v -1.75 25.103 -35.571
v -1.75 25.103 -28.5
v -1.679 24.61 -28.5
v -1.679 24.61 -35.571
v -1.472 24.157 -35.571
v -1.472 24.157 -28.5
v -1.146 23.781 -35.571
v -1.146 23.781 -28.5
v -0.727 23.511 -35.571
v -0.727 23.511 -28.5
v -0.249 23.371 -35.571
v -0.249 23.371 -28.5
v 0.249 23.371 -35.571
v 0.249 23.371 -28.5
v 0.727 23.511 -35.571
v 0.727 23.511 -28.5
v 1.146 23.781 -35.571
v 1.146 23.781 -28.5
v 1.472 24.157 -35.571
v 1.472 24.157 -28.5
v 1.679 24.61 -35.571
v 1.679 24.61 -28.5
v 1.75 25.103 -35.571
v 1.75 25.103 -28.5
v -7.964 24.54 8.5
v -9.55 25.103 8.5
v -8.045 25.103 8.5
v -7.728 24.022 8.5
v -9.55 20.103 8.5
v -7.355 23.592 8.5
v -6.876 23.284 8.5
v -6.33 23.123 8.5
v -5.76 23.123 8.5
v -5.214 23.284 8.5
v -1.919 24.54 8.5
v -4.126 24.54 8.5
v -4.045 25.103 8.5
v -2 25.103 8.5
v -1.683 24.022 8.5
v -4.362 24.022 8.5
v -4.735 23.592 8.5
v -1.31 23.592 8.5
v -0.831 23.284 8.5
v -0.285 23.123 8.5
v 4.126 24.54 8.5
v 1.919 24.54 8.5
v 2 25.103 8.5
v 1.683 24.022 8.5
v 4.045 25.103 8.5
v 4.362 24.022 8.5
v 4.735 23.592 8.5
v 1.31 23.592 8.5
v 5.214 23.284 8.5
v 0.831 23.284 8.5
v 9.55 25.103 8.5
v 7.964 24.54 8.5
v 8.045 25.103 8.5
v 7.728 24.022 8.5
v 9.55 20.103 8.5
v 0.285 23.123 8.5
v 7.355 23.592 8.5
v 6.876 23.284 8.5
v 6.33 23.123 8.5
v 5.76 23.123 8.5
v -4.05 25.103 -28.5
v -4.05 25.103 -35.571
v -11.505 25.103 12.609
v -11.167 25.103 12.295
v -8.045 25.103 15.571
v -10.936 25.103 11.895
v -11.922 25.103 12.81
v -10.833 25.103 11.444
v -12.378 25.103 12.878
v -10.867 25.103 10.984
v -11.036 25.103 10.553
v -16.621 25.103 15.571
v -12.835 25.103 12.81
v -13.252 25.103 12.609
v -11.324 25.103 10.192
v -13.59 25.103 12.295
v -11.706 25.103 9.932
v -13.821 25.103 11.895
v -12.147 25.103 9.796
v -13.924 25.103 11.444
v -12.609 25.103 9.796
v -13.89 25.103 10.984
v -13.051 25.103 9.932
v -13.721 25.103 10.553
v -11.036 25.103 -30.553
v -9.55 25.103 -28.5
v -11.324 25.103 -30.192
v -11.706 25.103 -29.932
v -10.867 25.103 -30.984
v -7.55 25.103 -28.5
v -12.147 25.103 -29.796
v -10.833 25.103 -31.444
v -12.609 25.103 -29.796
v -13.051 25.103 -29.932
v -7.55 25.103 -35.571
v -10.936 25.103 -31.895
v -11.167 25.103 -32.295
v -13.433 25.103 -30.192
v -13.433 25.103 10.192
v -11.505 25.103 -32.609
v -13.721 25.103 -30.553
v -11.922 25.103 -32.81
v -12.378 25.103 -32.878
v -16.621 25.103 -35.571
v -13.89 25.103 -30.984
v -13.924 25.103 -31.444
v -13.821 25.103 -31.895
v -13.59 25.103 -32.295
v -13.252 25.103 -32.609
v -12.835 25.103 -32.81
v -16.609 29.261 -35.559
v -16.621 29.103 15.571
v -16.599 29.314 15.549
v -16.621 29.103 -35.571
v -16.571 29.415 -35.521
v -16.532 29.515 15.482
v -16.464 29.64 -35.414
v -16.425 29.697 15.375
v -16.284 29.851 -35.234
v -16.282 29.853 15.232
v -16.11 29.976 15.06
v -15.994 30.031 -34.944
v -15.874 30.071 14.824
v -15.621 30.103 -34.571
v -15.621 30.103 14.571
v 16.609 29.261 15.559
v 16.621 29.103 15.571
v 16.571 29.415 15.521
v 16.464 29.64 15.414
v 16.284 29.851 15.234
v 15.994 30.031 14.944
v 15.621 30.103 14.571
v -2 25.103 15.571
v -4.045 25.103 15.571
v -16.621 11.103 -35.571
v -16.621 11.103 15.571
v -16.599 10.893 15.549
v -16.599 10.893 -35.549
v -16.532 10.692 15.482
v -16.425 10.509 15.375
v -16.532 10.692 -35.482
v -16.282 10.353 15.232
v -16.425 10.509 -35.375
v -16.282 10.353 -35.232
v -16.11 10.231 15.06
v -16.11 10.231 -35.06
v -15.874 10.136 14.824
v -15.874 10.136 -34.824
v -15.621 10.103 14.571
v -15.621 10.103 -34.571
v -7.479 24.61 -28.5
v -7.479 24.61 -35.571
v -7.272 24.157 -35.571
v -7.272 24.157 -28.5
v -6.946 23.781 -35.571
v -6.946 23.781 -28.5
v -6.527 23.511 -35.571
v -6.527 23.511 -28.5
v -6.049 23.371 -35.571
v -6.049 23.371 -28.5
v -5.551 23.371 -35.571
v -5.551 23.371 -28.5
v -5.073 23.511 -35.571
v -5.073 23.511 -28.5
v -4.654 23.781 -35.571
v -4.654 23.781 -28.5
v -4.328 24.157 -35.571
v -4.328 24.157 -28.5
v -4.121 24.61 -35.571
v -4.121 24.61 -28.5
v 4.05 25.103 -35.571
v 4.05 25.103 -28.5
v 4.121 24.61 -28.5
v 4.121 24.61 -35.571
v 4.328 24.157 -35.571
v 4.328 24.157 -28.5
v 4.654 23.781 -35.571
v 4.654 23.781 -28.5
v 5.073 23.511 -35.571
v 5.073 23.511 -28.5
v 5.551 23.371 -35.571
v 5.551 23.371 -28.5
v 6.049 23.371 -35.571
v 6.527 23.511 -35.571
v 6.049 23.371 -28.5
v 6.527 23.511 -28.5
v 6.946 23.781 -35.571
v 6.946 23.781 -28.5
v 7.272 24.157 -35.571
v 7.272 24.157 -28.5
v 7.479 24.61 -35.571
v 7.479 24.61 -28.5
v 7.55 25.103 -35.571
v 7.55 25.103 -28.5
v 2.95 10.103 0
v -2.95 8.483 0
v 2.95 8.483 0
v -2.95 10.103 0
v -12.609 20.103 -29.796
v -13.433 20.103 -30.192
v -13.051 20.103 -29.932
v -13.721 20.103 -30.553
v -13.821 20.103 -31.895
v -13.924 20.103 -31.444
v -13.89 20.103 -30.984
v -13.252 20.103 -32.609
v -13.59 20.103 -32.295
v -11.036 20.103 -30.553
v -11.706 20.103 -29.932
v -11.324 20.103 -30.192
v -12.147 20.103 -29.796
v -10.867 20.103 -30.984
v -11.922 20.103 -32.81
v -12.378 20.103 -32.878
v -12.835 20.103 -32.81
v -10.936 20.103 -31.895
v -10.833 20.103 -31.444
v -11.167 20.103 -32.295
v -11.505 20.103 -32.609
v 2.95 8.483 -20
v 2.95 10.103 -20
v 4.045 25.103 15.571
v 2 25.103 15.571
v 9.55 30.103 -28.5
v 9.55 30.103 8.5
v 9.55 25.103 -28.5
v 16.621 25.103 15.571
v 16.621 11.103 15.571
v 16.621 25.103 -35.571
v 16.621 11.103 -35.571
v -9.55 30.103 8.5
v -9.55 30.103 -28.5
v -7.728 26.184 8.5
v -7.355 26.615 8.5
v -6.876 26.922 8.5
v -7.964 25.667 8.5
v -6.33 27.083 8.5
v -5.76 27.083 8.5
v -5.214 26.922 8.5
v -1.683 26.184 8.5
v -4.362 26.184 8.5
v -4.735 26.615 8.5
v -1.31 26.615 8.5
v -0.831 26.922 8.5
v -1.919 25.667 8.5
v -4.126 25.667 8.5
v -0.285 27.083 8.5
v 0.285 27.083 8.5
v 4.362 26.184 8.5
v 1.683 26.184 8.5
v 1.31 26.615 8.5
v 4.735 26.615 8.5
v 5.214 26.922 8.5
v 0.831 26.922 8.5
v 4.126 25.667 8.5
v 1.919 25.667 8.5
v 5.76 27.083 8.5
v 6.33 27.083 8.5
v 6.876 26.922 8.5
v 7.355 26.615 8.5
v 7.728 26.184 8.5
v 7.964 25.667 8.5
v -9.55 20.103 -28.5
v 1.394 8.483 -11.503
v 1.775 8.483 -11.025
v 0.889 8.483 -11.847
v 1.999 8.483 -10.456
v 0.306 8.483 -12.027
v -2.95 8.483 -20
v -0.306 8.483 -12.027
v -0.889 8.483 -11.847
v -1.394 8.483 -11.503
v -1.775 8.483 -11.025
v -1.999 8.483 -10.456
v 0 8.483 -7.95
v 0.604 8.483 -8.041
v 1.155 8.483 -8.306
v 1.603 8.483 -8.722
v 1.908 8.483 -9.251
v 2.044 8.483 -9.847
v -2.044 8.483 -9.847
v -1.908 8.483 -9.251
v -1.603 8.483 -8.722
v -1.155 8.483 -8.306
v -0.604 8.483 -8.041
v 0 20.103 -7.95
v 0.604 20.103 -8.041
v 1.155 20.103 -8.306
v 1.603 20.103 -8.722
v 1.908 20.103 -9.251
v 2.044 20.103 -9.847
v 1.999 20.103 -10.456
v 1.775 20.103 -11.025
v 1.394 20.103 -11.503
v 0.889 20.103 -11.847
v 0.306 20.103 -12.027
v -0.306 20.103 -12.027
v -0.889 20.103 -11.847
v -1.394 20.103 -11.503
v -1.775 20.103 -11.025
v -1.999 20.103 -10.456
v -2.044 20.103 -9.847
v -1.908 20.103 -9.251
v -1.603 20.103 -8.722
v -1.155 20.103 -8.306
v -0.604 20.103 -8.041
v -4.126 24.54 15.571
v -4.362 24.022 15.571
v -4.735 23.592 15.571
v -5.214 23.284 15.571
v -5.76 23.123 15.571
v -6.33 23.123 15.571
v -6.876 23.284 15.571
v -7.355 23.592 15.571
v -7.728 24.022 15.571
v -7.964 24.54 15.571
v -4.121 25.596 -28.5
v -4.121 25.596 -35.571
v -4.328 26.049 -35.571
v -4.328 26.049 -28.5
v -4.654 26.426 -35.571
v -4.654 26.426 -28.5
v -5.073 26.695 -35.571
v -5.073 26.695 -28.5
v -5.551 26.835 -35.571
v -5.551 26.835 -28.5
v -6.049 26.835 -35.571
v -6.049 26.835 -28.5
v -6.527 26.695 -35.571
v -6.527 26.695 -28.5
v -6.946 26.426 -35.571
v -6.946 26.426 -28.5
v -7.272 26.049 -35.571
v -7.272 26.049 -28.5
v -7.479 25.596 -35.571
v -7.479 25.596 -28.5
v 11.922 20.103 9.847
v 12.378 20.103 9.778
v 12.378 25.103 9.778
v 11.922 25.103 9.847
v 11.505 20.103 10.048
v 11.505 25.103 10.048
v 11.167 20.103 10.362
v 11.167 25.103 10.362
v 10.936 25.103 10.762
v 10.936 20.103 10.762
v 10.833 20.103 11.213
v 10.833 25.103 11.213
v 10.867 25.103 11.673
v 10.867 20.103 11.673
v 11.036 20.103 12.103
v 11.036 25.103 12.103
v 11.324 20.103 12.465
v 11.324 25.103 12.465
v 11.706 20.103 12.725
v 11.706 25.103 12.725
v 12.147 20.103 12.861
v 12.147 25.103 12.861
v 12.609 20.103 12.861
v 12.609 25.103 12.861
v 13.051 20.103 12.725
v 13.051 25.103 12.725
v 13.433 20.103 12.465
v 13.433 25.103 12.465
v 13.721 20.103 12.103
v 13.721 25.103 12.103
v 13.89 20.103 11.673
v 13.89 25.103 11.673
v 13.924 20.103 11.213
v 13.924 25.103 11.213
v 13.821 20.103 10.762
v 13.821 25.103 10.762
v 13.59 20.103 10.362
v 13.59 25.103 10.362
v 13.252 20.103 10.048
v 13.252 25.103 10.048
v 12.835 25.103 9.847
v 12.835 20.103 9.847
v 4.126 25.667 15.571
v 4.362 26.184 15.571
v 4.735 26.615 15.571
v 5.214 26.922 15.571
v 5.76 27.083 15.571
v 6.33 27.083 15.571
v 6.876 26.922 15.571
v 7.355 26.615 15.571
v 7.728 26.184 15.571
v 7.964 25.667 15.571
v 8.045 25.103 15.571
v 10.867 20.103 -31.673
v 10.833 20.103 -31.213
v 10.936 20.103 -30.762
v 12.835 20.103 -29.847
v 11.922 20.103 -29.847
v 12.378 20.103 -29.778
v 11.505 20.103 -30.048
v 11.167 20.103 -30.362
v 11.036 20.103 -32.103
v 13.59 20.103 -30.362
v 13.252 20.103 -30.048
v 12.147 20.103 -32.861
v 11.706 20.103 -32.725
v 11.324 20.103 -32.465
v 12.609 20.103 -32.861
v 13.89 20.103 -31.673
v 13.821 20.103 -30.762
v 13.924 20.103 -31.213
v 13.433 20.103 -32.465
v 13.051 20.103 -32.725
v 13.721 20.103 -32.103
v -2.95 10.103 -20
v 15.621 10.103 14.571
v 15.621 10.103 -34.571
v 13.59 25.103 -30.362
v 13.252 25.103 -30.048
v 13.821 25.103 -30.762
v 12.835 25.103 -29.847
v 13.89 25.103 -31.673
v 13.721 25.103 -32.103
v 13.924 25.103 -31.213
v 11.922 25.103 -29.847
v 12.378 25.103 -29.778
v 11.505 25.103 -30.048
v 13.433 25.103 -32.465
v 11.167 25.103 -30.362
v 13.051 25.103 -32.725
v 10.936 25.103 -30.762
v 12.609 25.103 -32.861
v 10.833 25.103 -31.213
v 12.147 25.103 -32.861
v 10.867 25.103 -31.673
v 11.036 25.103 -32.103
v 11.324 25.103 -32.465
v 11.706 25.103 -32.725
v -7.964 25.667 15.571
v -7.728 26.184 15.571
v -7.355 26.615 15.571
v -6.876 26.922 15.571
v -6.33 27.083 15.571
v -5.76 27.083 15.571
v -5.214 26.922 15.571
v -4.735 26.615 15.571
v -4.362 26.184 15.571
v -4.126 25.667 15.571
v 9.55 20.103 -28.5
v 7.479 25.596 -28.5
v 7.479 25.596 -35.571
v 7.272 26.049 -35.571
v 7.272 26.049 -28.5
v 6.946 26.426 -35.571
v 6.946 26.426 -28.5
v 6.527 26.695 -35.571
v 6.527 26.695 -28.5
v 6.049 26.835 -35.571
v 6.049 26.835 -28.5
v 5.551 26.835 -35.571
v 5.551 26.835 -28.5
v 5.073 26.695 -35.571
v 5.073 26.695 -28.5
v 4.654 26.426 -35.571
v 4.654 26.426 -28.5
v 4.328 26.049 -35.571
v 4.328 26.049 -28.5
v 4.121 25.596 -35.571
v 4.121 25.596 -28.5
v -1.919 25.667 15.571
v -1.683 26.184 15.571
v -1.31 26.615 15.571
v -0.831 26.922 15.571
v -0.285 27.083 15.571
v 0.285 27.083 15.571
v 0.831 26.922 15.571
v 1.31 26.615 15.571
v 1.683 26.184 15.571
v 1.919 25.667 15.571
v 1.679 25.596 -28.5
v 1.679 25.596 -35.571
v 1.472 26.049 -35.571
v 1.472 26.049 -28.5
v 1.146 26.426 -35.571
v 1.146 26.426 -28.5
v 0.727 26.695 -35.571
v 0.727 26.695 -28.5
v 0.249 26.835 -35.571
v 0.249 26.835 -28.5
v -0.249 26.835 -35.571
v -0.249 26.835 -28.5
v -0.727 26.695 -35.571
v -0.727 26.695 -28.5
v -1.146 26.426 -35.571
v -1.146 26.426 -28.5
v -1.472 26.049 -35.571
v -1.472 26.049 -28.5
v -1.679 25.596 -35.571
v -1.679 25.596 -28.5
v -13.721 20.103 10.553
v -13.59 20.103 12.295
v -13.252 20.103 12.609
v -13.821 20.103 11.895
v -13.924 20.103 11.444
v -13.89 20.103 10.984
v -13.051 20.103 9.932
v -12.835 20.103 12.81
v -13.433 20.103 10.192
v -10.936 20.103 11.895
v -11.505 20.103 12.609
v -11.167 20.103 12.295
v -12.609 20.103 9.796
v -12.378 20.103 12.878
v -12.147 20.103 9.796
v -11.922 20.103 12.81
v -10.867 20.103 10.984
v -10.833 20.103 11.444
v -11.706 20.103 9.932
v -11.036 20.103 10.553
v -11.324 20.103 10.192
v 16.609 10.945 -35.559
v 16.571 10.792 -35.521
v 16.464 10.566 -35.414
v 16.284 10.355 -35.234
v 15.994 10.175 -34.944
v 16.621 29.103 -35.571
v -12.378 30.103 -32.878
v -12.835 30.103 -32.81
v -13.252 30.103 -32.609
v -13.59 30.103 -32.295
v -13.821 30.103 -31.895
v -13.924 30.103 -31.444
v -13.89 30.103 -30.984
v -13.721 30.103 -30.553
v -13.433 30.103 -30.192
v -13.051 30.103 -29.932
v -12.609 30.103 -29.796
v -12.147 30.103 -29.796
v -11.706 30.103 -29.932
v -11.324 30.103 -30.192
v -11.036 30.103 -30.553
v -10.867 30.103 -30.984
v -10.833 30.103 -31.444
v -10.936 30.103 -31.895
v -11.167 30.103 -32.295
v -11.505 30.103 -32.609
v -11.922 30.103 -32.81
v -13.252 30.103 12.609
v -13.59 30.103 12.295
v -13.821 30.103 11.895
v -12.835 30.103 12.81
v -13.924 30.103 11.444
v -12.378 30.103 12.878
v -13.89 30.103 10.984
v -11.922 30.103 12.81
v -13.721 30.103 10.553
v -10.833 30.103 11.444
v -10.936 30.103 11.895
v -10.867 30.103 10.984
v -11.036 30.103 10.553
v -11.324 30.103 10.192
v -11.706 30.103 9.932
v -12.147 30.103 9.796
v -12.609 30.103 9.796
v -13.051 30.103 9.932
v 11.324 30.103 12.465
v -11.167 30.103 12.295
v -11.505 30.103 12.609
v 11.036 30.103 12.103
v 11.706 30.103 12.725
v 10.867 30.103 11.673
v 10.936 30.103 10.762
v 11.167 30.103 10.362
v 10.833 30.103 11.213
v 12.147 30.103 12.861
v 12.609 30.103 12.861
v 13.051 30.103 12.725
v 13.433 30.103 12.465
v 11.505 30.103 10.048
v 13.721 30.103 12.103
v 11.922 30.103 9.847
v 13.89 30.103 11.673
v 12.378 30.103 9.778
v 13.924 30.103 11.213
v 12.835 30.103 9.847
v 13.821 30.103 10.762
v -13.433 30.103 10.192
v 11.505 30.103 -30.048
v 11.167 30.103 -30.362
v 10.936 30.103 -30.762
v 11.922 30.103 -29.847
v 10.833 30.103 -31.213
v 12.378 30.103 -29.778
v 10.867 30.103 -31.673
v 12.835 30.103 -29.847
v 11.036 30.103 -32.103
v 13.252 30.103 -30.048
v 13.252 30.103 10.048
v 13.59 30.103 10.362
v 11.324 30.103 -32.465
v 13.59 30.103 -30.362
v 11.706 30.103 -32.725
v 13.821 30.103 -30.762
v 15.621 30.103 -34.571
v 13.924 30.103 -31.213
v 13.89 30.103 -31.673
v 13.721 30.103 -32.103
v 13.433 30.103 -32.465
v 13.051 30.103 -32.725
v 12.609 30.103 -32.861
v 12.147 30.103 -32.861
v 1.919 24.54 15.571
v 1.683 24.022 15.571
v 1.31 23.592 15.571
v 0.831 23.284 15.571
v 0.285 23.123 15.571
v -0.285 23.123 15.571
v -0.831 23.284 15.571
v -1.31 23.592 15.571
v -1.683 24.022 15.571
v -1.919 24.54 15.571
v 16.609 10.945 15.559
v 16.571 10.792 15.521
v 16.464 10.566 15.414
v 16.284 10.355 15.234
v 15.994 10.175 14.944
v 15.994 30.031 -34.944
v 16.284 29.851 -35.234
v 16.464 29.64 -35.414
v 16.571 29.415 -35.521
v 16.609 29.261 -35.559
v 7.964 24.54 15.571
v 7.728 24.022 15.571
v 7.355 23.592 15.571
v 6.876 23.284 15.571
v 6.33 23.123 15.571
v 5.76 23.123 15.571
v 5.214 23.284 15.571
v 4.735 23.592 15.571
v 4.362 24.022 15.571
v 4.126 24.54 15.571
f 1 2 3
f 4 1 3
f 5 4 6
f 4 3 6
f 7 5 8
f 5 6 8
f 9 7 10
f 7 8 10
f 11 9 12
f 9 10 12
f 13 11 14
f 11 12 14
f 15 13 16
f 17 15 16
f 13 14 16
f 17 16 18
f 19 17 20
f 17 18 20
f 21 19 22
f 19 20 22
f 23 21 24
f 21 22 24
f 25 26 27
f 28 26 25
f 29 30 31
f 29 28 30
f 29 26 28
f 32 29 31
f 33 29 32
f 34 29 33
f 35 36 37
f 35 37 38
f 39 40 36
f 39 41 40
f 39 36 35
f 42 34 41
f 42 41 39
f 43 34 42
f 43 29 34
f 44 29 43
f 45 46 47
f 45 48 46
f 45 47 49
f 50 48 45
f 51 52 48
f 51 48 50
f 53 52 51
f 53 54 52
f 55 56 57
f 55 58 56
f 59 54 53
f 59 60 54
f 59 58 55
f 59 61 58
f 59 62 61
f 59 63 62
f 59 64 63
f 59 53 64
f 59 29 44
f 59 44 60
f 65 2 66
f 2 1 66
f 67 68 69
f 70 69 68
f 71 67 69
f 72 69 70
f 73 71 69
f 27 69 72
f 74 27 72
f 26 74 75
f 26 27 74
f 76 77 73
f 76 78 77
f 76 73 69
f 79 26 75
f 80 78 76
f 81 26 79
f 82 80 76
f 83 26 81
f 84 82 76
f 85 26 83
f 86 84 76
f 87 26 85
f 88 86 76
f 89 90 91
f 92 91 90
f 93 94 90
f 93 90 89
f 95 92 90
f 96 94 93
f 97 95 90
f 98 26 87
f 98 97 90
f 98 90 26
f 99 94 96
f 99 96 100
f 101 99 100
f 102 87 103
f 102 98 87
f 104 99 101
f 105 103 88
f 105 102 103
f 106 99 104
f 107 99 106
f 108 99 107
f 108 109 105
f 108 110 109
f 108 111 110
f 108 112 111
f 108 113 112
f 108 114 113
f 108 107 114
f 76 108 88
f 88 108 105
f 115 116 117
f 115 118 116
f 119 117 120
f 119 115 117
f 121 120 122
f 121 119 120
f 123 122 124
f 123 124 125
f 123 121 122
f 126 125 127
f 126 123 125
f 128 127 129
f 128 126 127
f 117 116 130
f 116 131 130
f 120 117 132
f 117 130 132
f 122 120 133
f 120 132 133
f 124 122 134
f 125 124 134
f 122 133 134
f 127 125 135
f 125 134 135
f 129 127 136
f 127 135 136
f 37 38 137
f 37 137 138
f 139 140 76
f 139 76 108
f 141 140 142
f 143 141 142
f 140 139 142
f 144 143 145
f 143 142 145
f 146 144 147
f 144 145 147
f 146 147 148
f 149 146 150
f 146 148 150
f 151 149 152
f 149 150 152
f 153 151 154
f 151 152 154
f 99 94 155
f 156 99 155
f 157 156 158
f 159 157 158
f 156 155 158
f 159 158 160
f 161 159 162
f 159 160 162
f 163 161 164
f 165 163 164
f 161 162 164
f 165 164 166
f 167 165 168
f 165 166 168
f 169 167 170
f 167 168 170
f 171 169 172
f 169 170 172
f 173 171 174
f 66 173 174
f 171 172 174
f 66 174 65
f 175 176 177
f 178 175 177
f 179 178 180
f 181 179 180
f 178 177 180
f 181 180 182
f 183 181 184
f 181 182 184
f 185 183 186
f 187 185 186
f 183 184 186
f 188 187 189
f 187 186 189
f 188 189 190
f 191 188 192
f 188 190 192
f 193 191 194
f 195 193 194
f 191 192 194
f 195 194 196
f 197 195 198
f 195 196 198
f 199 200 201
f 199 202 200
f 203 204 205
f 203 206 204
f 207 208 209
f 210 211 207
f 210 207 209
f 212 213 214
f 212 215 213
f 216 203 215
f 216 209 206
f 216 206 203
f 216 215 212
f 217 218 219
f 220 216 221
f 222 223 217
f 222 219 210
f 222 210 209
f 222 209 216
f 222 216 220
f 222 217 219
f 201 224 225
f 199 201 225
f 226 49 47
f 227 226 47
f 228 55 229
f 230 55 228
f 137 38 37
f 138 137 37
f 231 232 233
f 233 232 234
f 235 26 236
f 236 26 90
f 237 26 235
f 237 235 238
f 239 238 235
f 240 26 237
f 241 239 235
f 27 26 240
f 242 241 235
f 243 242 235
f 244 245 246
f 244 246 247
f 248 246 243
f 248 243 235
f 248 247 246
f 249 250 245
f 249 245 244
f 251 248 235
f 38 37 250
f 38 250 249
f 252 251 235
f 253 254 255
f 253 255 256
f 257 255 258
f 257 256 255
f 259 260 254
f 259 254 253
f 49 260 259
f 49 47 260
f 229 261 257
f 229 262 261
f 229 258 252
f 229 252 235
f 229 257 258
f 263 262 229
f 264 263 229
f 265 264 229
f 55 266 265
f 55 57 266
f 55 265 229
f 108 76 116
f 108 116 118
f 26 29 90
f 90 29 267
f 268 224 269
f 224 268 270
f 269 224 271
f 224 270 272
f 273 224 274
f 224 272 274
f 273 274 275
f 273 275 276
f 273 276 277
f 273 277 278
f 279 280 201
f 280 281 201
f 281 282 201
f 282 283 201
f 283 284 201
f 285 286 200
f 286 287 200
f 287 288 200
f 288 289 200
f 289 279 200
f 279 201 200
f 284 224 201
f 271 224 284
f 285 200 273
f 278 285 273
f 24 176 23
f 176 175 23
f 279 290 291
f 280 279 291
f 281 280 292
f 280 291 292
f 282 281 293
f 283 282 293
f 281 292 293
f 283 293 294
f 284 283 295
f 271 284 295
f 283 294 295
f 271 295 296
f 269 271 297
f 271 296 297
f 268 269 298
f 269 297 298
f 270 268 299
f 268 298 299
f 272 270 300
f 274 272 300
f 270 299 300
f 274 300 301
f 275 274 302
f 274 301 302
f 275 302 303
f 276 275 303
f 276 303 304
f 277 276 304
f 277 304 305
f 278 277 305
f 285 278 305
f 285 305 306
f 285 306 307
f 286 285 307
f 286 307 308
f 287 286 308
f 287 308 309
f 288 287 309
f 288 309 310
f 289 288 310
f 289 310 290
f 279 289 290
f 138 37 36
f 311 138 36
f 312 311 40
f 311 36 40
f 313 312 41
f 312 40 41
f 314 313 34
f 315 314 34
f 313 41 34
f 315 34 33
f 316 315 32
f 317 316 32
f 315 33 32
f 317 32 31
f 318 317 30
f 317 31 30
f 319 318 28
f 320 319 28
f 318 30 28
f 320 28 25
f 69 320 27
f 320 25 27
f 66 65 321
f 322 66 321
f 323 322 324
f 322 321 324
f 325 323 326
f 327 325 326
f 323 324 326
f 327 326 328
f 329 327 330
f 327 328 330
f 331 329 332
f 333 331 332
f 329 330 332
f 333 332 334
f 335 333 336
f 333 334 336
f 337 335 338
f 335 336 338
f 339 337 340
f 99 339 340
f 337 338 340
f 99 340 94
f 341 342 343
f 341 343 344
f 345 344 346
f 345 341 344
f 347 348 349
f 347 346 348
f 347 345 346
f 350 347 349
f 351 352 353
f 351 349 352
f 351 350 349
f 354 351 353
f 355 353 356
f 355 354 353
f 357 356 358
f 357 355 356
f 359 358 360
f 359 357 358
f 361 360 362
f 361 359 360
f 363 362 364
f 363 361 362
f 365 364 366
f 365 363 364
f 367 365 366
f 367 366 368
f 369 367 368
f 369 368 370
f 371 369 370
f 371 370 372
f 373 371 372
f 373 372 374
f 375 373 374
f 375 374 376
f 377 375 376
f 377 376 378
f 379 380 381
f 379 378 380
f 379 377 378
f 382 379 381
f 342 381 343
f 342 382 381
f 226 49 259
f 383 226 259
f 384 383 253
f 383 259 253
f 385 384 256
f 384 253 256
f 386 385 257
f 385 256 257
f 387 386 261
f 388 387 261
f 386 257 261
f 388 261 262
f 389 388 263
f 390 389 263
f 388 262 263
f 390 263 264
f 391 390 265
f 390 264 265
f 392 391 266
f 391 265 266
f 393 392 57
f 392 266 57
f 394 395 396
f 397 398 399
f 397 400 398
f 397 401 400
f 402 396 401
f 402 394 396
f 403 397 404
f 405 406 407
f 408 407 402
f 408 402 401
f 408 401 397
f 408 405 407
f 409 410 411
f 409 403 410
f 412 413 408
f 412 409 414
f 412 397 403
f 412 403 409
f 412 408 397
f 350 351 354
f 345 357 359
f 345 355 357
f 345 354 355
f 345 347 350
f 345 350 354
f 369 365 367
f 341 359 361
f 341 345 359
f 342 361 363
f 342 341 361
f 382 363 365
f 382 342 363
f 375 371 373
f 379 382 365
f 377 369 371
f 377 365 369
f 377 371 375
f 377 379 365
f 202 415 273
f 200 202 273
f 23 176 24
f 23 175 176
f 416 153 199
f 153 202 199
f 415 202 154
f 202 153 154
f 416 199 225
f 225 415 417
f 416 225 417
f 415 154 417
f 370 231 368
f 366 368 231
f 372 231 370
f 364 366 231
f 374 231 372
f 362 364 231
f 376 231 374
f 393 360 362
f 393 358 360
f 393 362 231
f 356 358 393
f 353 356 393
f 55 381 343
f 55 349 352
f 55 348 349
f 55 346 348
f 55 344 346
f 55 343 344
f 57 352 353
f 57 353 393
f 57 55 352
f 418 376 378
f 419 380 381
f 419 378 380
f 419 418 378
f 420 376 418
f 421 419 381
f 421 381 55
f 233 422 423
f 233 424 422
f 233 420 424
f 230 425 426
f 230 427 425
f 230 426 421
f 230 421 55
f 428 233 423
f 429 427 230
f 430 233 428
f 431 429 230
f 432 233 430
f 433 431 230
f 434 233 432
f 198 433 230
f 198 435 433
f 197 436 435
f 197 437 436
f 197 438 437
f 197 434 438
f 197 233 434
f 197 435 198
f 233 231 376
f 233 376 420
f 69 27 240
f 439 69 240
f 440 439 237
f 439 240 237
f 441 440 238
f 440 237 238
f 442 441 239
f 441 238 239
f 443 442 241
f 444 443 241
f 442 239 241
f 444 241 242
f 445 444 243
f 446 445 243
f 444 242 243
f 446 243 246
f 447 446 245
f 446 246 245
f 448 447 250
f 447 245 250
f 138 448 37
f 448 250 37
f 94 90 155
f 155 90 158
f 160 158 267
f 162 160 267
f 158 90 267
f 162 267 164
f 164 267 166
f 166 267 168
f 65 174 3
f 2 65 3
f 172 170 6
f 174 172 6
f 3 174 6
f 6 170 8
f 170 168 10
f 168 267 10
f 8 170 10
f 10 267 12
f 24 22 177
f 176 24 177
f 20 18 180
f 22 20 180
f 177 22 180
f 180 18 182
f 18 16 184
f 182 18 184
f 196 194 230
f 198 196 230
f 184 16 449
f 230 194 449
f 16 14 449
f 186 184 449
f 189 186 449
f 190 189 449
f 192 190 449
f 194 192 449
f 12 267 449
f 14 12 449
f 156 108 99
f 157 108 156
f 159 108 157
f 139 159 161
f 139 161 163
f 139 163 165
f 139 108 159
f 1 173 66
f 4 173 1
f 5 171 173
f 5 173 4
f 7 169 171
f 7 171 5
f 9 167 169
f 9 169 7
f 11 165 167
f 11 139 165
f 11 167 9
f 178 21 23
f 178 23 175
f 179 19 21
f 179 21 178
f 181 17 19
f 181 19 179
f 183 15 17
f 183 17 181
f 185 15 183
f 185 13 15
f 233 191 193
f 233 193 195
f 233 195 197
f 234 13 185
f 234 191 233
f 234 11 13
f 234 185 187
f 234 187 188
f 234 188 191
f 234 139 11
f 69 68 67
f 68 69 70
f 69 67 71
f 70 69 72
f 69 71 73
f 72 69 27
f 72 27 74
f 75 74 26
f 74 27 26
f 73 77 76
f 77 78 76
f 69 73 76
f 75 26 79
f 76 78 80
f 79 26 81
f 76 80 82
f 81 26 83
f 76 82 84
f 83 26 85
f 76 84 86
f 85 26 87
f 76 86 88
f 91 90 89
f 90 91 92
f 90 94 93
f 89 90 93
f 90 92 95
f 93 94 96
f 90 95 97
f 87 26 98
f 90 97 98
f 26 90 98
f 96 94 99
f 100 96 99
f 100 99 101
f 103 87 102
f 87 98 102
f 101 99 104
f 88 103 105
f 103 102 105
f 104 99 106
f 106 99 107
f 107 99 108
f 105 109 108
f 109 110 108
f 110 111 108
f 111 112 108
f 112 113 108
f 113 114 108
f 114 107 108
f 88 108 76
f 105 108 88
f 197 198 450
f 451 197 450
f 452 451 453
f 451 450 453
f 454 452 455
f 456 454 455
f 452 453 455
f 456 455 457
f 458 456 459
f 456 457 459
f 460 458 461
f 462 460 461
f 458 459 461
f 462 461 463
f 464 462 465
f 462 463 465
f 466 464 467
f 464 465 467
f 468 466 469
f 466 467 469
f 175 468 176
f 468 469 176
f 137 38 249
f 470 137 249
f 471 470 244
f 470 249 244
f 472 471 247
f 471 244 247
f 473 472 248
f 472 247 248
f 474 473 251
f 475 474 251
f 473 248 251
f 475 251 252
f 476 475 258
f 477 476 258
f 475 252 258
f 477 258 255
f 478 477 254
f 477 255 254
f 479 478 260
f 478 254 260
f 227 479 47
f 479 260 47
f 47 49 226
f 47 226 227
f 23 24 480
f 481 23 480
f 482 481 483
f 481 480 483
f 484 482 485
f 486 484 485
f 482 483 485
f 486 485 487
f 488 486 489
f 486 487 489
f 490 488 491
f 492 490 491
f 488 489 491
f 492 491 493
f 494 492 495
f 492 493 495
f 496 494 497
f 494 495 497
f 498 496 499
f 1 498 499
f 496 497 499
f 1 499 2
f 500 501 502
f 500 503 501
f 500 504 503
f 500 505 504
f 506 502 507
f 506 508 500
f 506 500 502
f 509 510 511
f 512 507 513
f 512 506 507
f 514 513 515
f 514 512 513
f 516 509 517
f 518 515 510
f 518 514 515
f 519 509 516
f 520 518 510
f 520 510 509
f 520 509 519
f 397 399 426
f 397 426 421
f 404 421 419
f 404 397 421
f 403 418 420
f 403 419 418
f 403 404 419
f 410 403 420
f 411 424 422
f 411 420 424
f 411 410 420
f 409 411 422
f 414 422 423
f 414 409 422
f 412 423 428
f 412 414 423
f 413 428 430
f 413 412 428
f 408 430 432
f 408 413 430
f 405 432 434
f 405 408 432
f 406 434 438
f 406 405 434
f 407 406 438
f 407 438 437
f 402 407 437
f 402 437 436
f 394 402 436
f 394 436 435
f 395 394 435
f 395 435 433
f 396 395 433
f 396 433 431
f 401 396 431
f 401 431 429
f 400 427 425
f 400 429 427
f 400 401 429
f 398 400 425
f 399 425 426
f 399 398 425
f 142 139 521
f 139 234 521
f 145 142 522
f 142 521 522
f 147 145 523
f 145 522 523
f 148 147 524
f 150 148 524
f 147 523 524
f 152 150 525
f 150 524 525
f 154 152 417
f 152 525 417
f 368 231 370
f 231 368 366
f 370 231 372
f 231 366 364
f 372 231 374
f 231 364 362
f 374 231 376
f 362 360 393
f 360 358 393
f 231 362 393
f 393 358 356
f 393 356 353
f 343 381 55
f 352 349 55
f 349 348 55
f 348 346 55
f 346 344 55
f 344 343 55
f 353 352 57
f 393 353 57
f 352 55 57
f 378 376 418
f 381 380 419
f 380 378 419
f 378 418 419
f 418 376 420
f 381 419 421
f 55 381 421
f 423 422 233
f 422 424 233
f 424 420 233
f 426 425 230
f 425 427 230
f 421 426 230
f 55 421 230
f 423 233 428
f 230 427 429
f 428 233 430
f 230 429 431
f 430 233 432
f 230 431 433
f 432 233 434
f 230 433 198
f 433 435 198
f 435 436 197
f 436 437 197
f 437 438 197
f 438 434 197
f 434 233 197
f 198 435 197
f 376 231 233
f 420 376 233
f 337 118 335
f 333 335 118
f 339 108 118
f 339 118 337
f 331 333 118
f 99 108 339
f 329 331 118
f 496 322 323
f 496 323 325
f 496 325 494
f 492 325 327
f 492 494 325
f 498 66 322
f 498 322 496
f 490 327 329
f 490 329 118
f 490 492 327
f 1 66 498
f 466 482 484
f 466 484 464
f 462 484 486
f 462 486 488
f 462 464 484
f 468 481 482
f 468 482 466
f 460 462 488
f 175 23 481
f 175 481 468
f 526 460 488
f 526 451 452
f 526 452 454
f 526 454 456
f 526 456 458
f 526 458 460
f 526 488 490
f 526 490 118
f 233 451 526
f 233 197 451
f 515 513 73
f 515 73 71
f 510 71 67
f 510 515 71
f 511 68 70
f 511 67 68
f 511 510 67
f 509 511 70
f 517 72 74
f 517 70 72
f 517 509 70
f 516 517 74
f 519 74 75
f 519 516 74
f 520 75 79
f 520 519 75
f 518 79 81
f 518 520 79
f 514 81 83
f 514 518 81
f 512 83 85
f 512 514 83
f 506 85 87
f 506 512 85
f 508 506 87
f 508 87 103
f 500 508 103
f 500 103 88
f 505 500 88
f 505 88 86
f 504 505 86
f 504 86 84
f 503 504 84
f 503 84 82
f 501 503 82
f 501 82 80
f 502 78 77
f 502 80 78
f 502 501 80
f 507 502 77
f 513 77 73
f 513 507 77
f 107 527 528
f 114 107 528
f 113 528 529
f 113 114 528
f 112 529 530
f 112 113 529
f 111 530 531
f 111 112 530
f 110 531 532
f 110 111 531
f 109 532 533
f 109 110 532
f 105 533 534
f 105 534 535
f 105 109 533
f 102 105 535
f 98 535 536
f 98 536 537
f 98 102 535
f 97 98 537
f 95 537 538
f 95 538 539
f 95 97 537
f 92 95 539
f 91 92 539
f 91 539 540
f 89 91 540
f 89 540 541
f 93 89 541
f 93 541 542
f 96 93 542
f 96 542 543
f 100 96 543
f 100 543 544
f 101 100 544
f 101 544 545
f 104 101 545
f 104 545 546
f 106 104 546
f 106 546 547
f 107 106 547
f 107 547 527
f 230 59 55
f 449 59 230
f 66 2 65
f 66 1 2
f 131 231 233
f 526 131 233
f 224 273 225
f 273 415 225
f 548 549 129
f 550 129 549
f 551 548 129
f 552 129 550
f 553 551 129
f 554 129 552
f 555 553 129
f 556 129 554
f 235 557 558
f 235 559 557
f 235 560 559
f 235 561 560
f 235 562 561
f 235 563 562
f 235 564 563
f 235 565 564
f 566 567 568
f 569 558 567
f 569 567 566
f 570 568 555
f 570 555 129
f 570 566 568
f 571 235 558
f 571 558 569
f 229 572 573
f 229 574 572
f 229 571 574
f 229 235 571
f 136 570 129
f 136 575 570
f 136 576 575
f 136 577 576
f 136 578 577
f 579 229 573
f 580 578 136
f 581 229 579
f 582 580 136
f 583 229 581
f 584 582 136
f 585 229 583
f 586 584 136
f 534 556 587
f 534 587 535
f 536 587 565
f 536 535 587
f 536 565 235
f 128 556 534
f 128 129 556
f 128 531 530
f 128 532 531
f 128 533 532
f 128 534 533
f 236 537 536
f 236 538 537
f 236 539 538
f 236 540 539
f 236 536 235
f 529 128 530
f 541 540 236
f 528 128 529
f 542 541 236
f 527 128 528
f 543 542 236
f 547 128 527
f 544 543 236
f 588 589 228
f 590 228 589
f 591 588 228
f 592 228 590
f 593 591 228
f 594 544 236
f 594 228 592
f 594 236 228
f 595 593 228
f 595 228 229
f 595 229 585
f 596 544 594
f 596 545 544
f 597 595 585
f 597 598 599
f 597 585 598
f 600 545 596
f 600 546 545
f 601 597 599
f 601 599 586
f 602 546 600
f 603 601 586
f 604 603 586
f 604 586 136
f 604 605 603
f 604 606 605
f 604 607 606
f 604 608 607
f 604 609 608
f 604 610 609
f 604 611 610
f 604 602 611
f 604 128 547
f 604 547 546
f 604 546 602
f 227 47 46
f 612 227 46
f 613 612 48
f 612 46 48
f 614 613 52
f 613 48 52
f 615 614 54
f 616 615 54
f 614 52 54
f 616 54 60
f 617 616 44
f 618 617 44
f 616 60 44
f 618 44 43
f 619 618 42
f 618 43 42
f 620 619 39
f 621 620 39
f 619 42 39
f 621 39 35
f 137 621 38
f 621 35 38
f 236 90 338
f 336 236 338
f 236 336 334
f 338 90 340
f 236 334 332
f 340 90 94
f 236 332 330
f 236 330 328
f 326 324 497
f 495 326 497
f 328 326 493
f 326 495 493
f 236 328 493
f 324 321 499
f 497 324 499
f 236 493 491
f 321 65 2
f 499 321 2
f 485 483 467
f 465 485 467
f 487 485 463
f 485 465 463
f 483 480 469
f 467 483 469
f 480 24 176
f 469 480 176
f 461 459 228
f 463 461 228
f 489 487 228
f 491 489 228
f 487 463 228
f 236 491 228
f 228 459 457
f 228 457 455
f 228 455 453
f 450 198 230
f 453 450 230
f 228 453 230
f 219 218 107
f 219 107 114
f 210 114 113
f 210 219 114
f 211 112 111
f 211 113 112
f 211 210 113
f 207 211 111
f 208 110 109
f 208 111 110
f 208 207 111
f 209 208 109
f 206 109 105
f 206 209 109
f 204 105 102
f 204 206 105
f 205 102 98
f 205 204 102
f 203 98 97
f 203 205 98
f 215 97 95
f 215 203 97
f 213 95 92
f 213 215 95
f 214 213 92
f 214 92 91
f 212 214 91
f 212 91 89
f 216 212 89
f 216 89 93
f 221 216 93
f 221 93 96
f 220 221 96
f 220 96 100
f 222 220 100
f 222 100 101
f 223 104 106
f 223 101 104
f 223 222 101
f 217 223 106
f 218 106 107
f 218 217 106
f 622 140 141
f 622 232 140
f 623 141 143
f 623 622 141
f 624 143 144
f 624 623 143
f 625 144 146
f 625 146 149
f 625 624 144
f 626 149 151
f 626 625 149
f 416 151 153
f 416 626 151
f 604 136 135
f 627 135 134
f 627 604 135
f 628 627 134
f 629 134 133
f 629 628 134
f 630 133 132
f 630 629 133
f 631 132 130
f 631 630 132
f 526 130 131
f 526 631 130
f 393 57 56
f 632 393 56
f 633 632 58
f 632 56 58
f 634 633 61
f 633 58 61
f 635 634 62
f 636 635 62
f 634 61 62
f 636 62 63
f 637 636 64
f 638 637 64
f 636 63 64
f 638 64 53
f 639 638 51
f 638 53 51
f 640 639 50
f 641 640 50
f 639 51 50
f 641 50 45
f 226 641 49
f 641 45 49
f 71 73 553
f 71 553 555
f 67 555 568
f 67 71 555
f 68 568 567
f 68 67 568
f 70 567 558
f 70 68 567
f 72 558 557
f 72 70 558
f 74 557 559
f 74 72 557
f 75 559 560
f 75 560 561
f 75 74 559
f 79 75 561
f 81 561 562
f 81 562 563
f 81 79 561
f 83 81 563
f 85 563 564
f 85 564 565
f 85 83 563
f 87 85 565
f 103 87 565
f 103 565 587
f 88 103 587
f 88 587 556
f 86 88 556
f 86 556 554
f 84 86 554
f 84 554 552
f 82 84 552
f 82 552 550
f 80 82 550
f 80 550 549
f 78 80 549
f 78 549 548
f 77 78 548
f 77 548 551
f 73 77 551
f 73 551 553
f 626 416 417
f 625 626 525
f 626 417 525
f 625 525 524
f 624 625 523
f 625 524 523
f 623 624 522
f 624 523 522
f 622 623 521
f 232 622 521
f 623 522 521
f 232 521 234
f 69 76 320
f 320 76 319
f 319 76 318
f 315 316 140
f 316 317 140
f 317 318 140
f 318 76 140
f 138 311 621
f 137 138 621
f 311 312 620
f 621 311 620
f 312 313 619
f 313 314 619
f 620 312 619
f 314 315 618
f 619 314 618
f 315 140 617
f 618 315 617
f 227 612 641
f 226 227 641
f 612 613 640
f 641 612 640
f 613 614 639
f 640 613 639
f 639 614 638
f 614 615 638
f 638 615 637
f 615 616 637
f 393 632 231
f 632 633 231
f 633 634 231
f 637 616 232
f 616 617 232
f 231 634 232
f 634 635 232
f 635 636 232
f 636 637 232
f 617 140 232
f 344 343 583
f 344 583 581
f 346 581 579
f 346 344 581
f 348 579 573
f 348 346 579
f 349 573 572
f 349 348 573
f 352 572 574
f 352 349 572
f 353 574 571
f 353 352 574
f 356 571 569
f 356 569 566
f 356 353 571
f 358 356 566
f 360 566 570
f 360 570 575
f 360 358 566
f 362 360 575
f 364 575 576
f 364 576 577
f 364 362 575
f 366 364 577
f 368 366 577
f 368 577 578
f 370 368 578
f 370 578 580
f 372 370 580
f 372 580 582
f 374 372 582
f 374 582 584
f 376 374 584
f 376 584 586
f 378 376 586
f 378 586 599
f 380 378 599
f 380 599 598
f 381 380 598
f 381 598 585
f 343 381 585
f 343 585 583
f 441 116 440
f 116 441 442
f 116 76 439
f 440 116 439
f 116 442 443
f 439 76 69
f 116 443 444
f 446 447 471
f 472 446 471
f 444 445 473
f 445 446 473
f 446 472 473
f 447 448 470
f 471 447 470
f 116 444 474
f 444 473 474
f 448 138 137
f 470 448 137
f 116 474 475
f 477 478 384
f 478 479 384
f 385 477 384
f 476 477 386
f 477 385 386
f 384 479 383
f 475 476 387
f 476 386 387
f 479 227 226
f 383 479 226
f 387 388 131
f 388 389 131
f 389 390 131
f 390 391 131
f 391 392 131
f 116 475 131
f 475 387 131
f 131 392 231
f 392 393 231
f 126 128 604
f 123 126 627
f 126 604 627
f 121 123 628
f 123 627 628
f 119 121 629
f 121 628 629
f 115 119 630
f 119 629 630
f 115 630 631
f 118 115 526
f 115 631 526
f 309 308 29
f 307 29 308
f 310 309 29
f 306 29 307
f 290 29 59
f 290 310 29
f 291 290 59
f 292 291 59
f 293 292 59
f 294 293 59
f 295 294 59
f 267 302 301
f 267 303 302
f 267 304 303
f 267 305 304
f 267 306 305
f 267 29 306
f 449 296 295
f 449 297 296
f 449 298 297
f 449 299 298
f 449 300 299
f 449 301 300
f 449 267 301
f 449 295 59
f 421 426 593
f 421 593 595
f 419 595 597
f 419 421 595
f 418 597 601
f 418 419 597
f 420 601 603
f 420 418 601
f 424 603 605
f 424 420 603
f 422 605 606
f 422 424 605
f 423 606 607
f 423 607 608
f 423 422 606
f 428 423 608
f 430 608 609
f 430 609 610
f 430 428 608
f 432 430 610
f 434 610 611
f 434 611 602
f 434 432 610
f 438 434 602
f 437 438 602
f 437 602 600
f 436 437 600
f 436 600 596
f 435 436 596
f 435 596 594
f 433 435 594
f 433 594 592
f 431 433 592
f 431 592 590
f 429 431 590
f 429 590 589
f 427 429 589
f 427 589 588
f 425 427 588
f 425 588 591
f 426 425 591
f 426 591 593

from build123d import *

# Parameters (mm, degrees)
BOSS_EXTRU_1_DEPTH           = 20
CONG_1_R                     = 0.5
CONG_2_R                     = 1
ESQUISSE3_W                  = 33.24213562373096
ESQUISSE3_H                  = 51.142135623730944
ESQUISSE3_R                  = 1.5499999999999992
ESQUISSE3_R_2                = 1.5499999999999898
ESQUISSE3_W_2                = 19.1
ESQUISSE3_H_2                = 37
BOSS_EXTRU_2_DEPTH           = 10
ESQUISSE3_3_W                = 33.24213562373096
ESQUISSE3_3_H                = 51.142135623730944
ESQUISSE3_3_R                = 1.5499999999999992
ESQUISSE3_3_R_2              = 1.5499999999999898
ESQUISSE3_3_W_2              = 19.1
ESQUISSE3_3_H_2              = 37
BOSS_EXTRU_4_DEPTH           = 20
TROUS_MOTEUR_REACH           = 57.899
ESQUISSE8_R                  = 1.7500000000000038
ESQUISSE8_R_2                = 1.7500000000000027
ENL_V_MAT_EXTRU_1_DEPTH      = 50.47483724416424
TROUS_CABLES_PUISSANCE_REACH = 57.899
ESQUISSE9_R                  = 2
ESQUISSE9_R_2                = 2.000000000000005
ESQUISSE9_R_3                = 2.0000000000000053
ENL_V_MAT_EXTRU_4_REACH      = 42.946
ESQUISSE10_R                 = 2.05
CONG_3_R                     = 1
FRACTIONNER1_SURFACE_1_BACK  = 65.715
FRACTIONNER1_SURFACE_1_DEPTH = 131.43
FRACTIONNER1_SURFACE_2_BACK  = 65.715
FRACTIONNER1_SURFACE_2_DEPTH = 131.43


with BuildPart() as part:
    # Esquisse1 → Boss.-Extru.1 (new body)
    with BuildSketch(Plane.XY):
        Polygon((-1.176e-14, 10.103135382441117), (-2.578e-14, 4.840000000000001), (3.5, 4.840000000000001), (5.71, 6.983135382441116), (5.71, 8.483135382441116), (2.95, 8.483135382441116), (2.95, 10.103135382441117), align=None)
        Polygon((-3.5, 4.840000000000001), (-2.576e-14, 4.840000000000001), (-1.176e-14, 10.103135382441117), (-2.95, 10.103135382441117), (-2.95, 8.483135382441116), (-5.71, 8.483135382441116), (-5.71, 6.983135382441116), align=None)
    extrude(amount=-BOSS_EXTRU_1_DEPTH)

    # Congé1
    cong_1_edges = [part.edges().sort_by_distance(p)[0] for p in [
        (5.71, 7.733135382441116, 0),
        (4.605, 5.911567691220558, 0),
        (0, 4.840000000000001, 0),
        (-4.605, 5.911567691220558, 0),
        (-5.71, 7.733135382441116, 0),
        (-5.71, 7.733135382441116, -20),
        (-4.605, 5.911567691220558, -20),
        (0, 4.840000000000001, -20),
        (4.605, 5.911567691220558, -20),
        (5.71, 7.733135382441116, -20),
    ]]
    fillet(cong_1_edges, radius=CONG_1_R)

    # Congé2
    # the kernel refuses this fillet: 1 mm, written as the material it takes off along each edge
    with BuildSketch(Plane(origin=(4.71, 7.4063748668930085, -20), x_dir=(1, 0, 0), z_dir=(0, 1, 0))) as cong_2_piece_1:
        with BuildLine():
            CenterArc((0.5, -0.5), 0.5, 0, 90)
            Line((1, -0.5), (1, 0))
            Line((1, 0), (0.5, 0))
        make_face()
    revolve(axis=Axis((4.71, 7.4063748668930085, -20), (0, 0, -1)), revolution_arc=45.87999999999987, mode=Mode.SUBTRACT)
    with BuildSketch(Plane(origin=(-4.710000000000001, 7.40637486689301, -20), x_dir=(-0.6961634275566162, -0.717883334625219, 0), z_dir=(0.717883334625219, -0.6961634275566162, 0))) as cong_2_piece_2:
        with BuildLine():
            CenterArc((0.5, -0.5), 0.5, 0, 90)
            Line((1, -0.5), (1, 0))
            Line((1, 0), (0.5, 0))
        make_face()
    revolve(axis=Axis((-4.710000000000001, 7.40637486689301, -20), (0, 0, -1)), revolution_arc=45.87999999999987, mode=Mode.SUBTRACT)
    with BuildSketch(Plane(origin=(4.71, 7.4063748668930085, 0), x_dir=(0.6961634275566162, -0.717883334625219, 0), z_dir=(-0.717883334625219, -0.6961634275566162, 0))) as cong_2_piece_3:
        with BuildLine():
            CenterArc((0.5, -0.5), 0.5, 0, 90)
            Line((1, -0.5), (1, 0))
            Line((1, 0), (0.5, 0))
        make_face()
    revolve(axis=Axis((4.71, 7.4063748668930085, 0), (0, 0, 1)), revolution_arc=45.87999999999987, mode=Mode.SUBTRACT)
    with BuildSketch(Plane(origin=(-4.710000000000001, 7.40637486689301, 0), x_dir=(-1, 0, 0), z_dir=(0, 1, 0))) as cong_2_piece_4:
        with BuildLine():
            CenterArc((0.5, -0.5), 0.5, 0, 90)
            Line((1, -0.5), (1, 0))
            Line((1, 0), (0.5, 0))
        make_face()
    revolve(axis=Axis((-4.710000000000001, 7.40637486689301, 0), (0, 0, 1)), revolution_arc=45.87999999999987, mode=Mode.SUBTRACT)
    with BuildSketch(Plane(origin=(-5.71, 6.983135382441116, 1.1e-16), x_dir=(0.717883334625219, -0.6961634275566161, 0), z_dir=(0, 0, -1))) as cong_2_piece_5:
        with BuildLine():
            CenterArc((CONG_2_R * 0.423239484452, -CONG_2_R), CONG_2_R, 90.00000000000003, 45.879999999999825)
            Line((-CONG_2_R * 0.294643850173, -CONG_2_R * 0.303836572443), (0, 0))
            Line((0, 0), (CONG_2_R * 0.423239484452, 0))
        make_face()
    extrude(amount=20, mode=Mode.SUBTRACT)
    with BuildSketch(Plane(origin=(5.71, 6.983135382441116, 1.1e-16), x_dir=(-0.7178833346252179, -0.6961634275566172, 0), z_dir=(0, 0, -1))) as cong_2_piece_6:
        with BuildLine():
            CenterArc((CONG_2_R * 0.423239484452, CONG_2_R), CONG_2_R, 224.12000000000015, 45.87999999999994)
            Line((-CONG_2_R * 0.294643850173, CONG_2_R * 0.303836572443), (0, 0))
            Line((0, 0), (CONG_2_R * 0.423239484452, 2e-17))
        make_face()
    extrude(amount=20, mode=Mode.SUBTRACT)

    # Esquisse3 → Boss.-Extru.2 (add)
    # profile 1 of 6: a face of its own
    with BuildSketch(Plane(origin=(0, 10.103135382441117, 0), x_dir=(1, 0, 0), z_dir=(0, 1, 0))):
        with Locations((1.78e-15, 9.999999999999996)):
            Rectangle(ESQUISSE3_W, ESQUISSE3_H)
        with Locations((12.37842712474619, -11.328427124746192)):
            Circle(ESQUISSE3_R, mode=Mode.SUBTRACT)
        with Locations((-12.37842712474619, -11.328427124746192)):
            Circle(ESQUISSE3_R, mode=Mode.SUBTRACT)
        with Locations((12.378427124746185, 31.328427124746177)):
            Circle(ESQUISSE3_R_2, mode=Mode.SUBTRACT)
        with Locations((-12.378427124746196, 31.328427124746177)):
            Circle(ESQUISSE3_R_2, mode=Mode.SUBTRACT)
        with Locations((1.78e-15, 10.000000000000004)):
            Rectangle(ESQUISSE3_W_2, ESQUISSE3_H_2, mode=Mode.SUBTRACT)
    # profile 2 of 6: a face of its own
    with BuildSketch(Plane(origin=(0, 10.103135382441117, 0), x_dir=(1, 0, 0), z_dir=(0, 1, 0))):
        with Locations((12.378427124746185, 31.328427124746177)):
            Circle(ESQUISSE3_R_2)
    # profile 3 of 6: a face of its own
    with BuildSketch(Plane(origin=(0, 10.103135382441117, 0), x_dir=(1, 0, 0), z_dir=(0, 1, 0))):
        with Locations((-12.378427124746196, 31.328427124746177)):
            Circle(ESQUISSE3_R_2)
    # profile 4 of 6: a face of its own
    with BuildSketch(Plane(origin=(0, 10.103135382441117, 0), x_dir=(1, 0, 0), z_dir=(0, 1, 0))):
        with Locations((-12.37842712474619, -11.328427124746192)):
            Circle(ESQUISSE3_R)
    # profile 5 of 6: a face of its own
    with BuildSketch(Plane(origin=(0, 10.103135382441117, 0), x_dir=(1, 0, 0), z_dir=(0, 1, 0))):
        with Locations((12.37842712474619, -11.328427124746192)):
            Circle(ESQUISSE3_R)
    # profile 6 of 6: a face of its own
    with BuildSketch(Plane(origin=(0, 10.103135382441117, 0), x_dir=(1, 0, 0), z_dir=(0, 1, 0))):
        Polygon((-9.549999999999999, 28.500000000000004), (-9.549999999999999, -8.499999999999996), (9.550000000000002, -8.499999999999998), (9.550000000000002, 28.500000000000004), align=None)
    extrude(amount=BOSS_EXTRU_2_DEPTH)

    # Esquisse3<3> → Boss.-Extru.4 (add)
    with BuildSketch(Plane(origin=(0, 10.103135382441117, 0), x_dir=(1, 0, 0), z_dir=(0, 1, 0))):
        with Locations((1.78e-15, 9.999999999999996)):
            Rectangle(ESQUISSE3_3_W, ESQUISSE3_3_H)
        with Locations(Location((-12.37842712474619, -11.328427124746192, 0), (0, 0, 270))):
            Circle(ESQUISSE3_3_R, mode=Mode.SUBTRACT)
        with Locations(Location((12.37842712474619, -11.328427124746192, 0), (0, 0, 90))):
            Circle(ESQUISSE3_3_R, mode=Mode.SUBTRACT)
        with Locations(Location((12.378427124746185, 31.328427124746177, 0), (0, 0, 270))):
            Circle(ESQUISSE3_3_R_2, mode=Mode.SUBTRACT)
        with Locations(Location((-12.378427124746196, 31.328427124746177, 0), (0, 0, 90))):
            Circle(ESQUISSE3_3_R_2, mode=Mode.SUBTRACT)
        with Locations((1.78e-15, 10.000000000000004)):
            Rectangle(ESQUISSE3_3_W_2, ESQUISSE3_3_H_2, mode=Mode.SUBTRACT)
    extrude(amount=BOSS_EXTRU_4_DEPTH)

    # Esquisse8 → Trous_moteur (cut, up to next)
    with BuildSketch(Plane.XY.offset(-28.500000000000004), mode=Mode.PRIVATE) as trous_moteur_sk1:
        with Locations((5.800000000000003, 25.10313538244111)):
            Circle(ESQUISSE8_R)
    trous_moteur_tool1 = extrude(trous_moteur_sk1.sketch, amount=-TROUS_MOTEUR_REACH, mode=Mode.PRIVATE) & part.part
    # Esquisse8 → Trous_moteur (cut, up to next)
    with BuildSketch(Plane.XY.offset(-28.500000000000004), mode=Mode.PRIVATE) as trous_moteur_sk2:
        with Locations((3.47e-15, 25.103135382441113)):
            Circle(ESQUISSE8_R_2)
    trous_moteur_tool2 = extrude(trous_moteur_sk2.sketch, amount=-TROUS_MOTEUR_REACH, mode=Mode.PRIVATE) & part.part
    # Esquisse8 → Trous_moteur (cut, up to next)
    with BuildSketch(Plane.XY.offset(-28.500000000000004), mode=Mode.PRIVATE) as trous_moteur_sk3:
        with Locations((-5.799999999999996, 25.103135382441117)):
            Circle(ESQUISSE8_R)
    trous_moteur_tool3 = extrude(trous_moteur_sk3.sketch, amount=-TROUS_MOTEUR_REACH, mode=Mode.PRIVATE) & part.part
    add(trous_moteur_tool1.solids().sort_by_distance((5.8, 25.103135, -28.5))[0], mode=Mode.SUBTRACT)
    add(trous_moteur_tool2.solids().sort_by_distance((0, 25.103135, -28.5))[0], mode=Mode.SUBTRACT)
    add(trous_moteur_tool3.solids().sort_by_distance((-5.8, 25.103135, -28.5))[0], mode=Mode.SUBTRACT)

    # Esquisse5 → Enlèv. mat.-Extru.1 (cut, through all)
    with BuildSketch(Plane.XY):
        with BuildLine():
            Line((-5.209999999999999, 8.483135382441116), (-5.71, 8.483135382441116))
            Line((-5.71, 8.483135382441116), (-5.71, 7.4063748668930085))
            ThreePointArc((-5.71, 7.4063748668930085), (-5.630913521335368, 7.01660790289825), (-5.406163427556616, 6.68849153226779))
            Line((-5.406163427556616, 6.68849153226779), (-3.5, 4.840000000000001))
            Line((-3.5, 4.840000000000001), (3.5, 4.840000000000001))
            Line((3.5, 4.840000000000001), (5.406163427556617, 6.68849153226779))
            ThreePointArc((5.406163427556617, 6.68849153226779), (5.630913521335369, 7.01660790289825), (5.71, 7.406374866893009))
            Line((5.71, 7.406374866893009), (5.71, 8.483135382441116))
            Line((5.71, 8.483135382441116), (5.209999999999999, 8.483135382441116))
            Line((5.209999999999999, 8.483135382441116), (2.95, 8.483135382441116))
            Line((2.95, 8.483135382441116), (-2.95, 8.483135382441116))
            Line((-2.95, 8.483135382441116), (-5.209999999999999, 8.483135382441116))
        make_face()
    extrude(amount=-ENL_V_MAT_EXTRU_1_DEPTH, mode=Mode.SUBTRACT)

    # Esquisse9 → Trous_cables_puissance (cut, up to next)
    with BuildSketch(Plane(origin=(0, 0, 8.499999999999998), x_dir=(-1, 0, 0), z_dir=(0, 0, -1)), mode=Mode.PRIVATE) as trous_cables_puissance_sk1:
        with Locations((6.044999999999998, 25.103135382441117)):
            Circle(ESQUISSE9_R)
    trous_cables_puissance_tool1 = extrude(trous_cables_puissance_sk1.sketch, amount=-TROUS_CABLES_PUISSANCE_REACH, mode=Mode.PRIVATE) & part.part
    # Esquisse9 → Trous_cables_puissance (cut, up to next)
    with BuildSketch(Plane(origin=(0, 0, 8.499999999999998), x_dir=(-1, 0, 0), z_dir=(0, 0, -1)), mode=Mode.PRIVATE) as trous_cables_puissance_sk2:
        with Locations((-6.045000000000002, 25.103135382441117)):
            Circle(ESQUISSE9_R_2)
    trous_cables_puissance_tool2 = extrude(trous_cables_puissance_sk2.sketch, amount=-TROUS_CABLES_PUISSANCE_REACH, mode=Mode.PRIVATE) & part.part
    # Esquisse9 → Trous_cables_puissance (cut, up to next)
    with BuildSketch(Plane(origin=(0, 0, 8.499999999999998), x_dir=(-1, 0, 0), z_dir=(0, 0, -1)), mode=Mode.PRIVATE) as trous_cables_puissance_sk3:
        with Locations((-1.73e-15, 25.103135382441117)):
            Circle(ESQUISSE9_R_3)
    trous_cables_puissance_tool3 = extrude(trous_cables_puissance_sk3.sketch, amount=-TROUS_CABLES_PUISSANCE_REACH, mode=Mode.PRIVATE) & part.part
    add(trous_cables_puissance_tool1.solids().sort_by_distance((-6.045, 25.103135, 8.5))[0], mode=Mode.SUBTRACT)
    add(trous_cables_puissance_tool2.solids().sort_by_distance((6.045, 25.103135, 8.5))[0], mode=Mode.SUBTRACT)
    add(trous_cables_puissance_tool3.solids().sort_by_distance((0, 25.103135, 8.5))[0], mode=Mode.SUBTRACT)

    # Esquisse10 → Enlèv. mat.-Extru.4 (cut, up to next)
    with BuildSketch(Plane(origin=(0, 20.103135382441113, 0), x_dir=(1, 0, 0), z_dir=(0, 1, 0)), mode=Mode.PRIVATE) as enl_v_mat_extru_4_sk1:
        with Locations(Location((1.73e-15, 10.000000000000004, 0), (0, 0, 270))):
            Circle(ESQUISSE10_R)
    enl_v_mat_extru_4_tool1 = extrude(enl_v_mat_extru_4_sk1.sketch, amount=-ENL_V_MAT_EXTRU_4_REACH, mode=Mode.PRIVATE) & part.part
    add(enl_v_mat_extru_4_tool1.solids().sort_by_distance((0, 20.103135, -10))[0], mode=Mode.SUBTRACT)

    # Congé3
    cong_3_edges = [part.edges().sort_by_distance(p)[0] for p in [
        (16.62106781186548, 10.103135382441117, -9.999999999999996),
        (3.55e-15, 10.103135382441117, -35.57106781186547),
        (-16.621067811865476, 10.103135382441117, -9.999999999999996),
        (0, 10.103135382441117, 15.571067811865476),
        (16.62106781186548, 30.103135382441117, -9.999999999999996),
        (3.55e-15, 30.103135382441117, -35.57106781186547),
        (-16.621067811865476, 30.103135382441117, -9.999999999999996),
        (0, 30.103135382441117, 15.571067811865476),
    ]]
    fillet(cong_3_edges, radius=CONG_3_R)


with BuildPart() as body_2:
    # Fractionner1: the piece behind the surface
    add(part.part)
    # Fractionner1 surface: a surface, the sketch's curves swept straight by 131.43 mm
    with BuildLine(Plane.XY.offset(15.571067811865476).offset(-FRACTIONNER1_SURFACE_1_BACK), mode=Mode.PRIVATE) as fractionner1_surface_1_path:
        Line((16.62106781186548, 29.103135382441117), (16.62106781186548, 25.103135382441113))
        Line((16.62106781186548, 25.103135382441113), (-16.62106781186548, 25.10313538244112))
        Line((-16.62106781186548, 25.10313538244112), (-16.621067811865476, 29.103135382441117))
        ThreePointArc((-16.621067811865476, 29.103135382441117), (-16.328174593052022, 29.810242163627663), (-15.621067811865476, 30.103135382441117))
        Line((-15.621067811865476, 30.103135382441117), (15.62106781186548, 30.103135382441117))
        ThreePointArc((15.62106781186548, 30.103135382441117), (16.328174593052026, 29.810242163627663), (16.62106781186548, 29.103135382441117))
    fractionner1_surface_1 = Shell.extrude(fractionner1_surface_1_path.wire(), (0 * FRACTIONNER1_SURFACE_1_DEPTH, 0 * FRACTIONNER1_SURFACE_1_DEPTH, 1 * FRACTIONNER1_SURFACE_1_DEPTH))
    split(bisect_by=fractionner1_surface_1, keep=Keep.BOTTOM)


with BuildPart() as part_1:
    add(part.part)

    # Fractionner1: split by a surface, the side it looks to stays
    # Fractionner1 surface: a surface, the sketch's curves swept straight by 131.43 mm
    with BuildLine(Plane.XY.offset(15.571067811865476).offset(-FRACTIONNER1_SURFACE_2_BACK), mode=Mode.PRIVATE) as fractionner1_surface_2_path:
        Line((16.62106781186548, 29.103135382441117), (16.62106781186548, 25.103135382441113))
        Line((16.62106781186548, 25.103135382441113), (-16.62106781186548, 25.10313538244112))
        Line((-16.62106781186548, 25.10313538244112), (-16.621067811865476, 29.103135382441117))
        ThreePointArc((-16.621067811865476, 29.103135382441117), (-16.328174593052022, 29.810242163627663), (-15.621067811865476, 30.103135382441117))
        Line((-15.621067811865476, 30.103135382441117), (15.62106781186548, 30.103135382441117))
        ThreePointArc((15.62106781186548, 30.103135382441117), (16.328174593052026, 29.810242163627663), (16.62106781186548, 29.103135382441117))
    fractionner1_surface_2 = Shell.extrude(fractionner1_surface_2_path.wire(), (0 * FRACTIONNER1_SURFACE_2_DEPTH, 0 * FRACTIONNER1_SURFACE_2_DEPTH, 1 * FRACTIONNER1_SURFACE_2_DEPTH))
    split(bisect_by=fractionner1_surface_2, keep=Keep.TOP)


solid = Compound([body_2.part, part_1.part])
